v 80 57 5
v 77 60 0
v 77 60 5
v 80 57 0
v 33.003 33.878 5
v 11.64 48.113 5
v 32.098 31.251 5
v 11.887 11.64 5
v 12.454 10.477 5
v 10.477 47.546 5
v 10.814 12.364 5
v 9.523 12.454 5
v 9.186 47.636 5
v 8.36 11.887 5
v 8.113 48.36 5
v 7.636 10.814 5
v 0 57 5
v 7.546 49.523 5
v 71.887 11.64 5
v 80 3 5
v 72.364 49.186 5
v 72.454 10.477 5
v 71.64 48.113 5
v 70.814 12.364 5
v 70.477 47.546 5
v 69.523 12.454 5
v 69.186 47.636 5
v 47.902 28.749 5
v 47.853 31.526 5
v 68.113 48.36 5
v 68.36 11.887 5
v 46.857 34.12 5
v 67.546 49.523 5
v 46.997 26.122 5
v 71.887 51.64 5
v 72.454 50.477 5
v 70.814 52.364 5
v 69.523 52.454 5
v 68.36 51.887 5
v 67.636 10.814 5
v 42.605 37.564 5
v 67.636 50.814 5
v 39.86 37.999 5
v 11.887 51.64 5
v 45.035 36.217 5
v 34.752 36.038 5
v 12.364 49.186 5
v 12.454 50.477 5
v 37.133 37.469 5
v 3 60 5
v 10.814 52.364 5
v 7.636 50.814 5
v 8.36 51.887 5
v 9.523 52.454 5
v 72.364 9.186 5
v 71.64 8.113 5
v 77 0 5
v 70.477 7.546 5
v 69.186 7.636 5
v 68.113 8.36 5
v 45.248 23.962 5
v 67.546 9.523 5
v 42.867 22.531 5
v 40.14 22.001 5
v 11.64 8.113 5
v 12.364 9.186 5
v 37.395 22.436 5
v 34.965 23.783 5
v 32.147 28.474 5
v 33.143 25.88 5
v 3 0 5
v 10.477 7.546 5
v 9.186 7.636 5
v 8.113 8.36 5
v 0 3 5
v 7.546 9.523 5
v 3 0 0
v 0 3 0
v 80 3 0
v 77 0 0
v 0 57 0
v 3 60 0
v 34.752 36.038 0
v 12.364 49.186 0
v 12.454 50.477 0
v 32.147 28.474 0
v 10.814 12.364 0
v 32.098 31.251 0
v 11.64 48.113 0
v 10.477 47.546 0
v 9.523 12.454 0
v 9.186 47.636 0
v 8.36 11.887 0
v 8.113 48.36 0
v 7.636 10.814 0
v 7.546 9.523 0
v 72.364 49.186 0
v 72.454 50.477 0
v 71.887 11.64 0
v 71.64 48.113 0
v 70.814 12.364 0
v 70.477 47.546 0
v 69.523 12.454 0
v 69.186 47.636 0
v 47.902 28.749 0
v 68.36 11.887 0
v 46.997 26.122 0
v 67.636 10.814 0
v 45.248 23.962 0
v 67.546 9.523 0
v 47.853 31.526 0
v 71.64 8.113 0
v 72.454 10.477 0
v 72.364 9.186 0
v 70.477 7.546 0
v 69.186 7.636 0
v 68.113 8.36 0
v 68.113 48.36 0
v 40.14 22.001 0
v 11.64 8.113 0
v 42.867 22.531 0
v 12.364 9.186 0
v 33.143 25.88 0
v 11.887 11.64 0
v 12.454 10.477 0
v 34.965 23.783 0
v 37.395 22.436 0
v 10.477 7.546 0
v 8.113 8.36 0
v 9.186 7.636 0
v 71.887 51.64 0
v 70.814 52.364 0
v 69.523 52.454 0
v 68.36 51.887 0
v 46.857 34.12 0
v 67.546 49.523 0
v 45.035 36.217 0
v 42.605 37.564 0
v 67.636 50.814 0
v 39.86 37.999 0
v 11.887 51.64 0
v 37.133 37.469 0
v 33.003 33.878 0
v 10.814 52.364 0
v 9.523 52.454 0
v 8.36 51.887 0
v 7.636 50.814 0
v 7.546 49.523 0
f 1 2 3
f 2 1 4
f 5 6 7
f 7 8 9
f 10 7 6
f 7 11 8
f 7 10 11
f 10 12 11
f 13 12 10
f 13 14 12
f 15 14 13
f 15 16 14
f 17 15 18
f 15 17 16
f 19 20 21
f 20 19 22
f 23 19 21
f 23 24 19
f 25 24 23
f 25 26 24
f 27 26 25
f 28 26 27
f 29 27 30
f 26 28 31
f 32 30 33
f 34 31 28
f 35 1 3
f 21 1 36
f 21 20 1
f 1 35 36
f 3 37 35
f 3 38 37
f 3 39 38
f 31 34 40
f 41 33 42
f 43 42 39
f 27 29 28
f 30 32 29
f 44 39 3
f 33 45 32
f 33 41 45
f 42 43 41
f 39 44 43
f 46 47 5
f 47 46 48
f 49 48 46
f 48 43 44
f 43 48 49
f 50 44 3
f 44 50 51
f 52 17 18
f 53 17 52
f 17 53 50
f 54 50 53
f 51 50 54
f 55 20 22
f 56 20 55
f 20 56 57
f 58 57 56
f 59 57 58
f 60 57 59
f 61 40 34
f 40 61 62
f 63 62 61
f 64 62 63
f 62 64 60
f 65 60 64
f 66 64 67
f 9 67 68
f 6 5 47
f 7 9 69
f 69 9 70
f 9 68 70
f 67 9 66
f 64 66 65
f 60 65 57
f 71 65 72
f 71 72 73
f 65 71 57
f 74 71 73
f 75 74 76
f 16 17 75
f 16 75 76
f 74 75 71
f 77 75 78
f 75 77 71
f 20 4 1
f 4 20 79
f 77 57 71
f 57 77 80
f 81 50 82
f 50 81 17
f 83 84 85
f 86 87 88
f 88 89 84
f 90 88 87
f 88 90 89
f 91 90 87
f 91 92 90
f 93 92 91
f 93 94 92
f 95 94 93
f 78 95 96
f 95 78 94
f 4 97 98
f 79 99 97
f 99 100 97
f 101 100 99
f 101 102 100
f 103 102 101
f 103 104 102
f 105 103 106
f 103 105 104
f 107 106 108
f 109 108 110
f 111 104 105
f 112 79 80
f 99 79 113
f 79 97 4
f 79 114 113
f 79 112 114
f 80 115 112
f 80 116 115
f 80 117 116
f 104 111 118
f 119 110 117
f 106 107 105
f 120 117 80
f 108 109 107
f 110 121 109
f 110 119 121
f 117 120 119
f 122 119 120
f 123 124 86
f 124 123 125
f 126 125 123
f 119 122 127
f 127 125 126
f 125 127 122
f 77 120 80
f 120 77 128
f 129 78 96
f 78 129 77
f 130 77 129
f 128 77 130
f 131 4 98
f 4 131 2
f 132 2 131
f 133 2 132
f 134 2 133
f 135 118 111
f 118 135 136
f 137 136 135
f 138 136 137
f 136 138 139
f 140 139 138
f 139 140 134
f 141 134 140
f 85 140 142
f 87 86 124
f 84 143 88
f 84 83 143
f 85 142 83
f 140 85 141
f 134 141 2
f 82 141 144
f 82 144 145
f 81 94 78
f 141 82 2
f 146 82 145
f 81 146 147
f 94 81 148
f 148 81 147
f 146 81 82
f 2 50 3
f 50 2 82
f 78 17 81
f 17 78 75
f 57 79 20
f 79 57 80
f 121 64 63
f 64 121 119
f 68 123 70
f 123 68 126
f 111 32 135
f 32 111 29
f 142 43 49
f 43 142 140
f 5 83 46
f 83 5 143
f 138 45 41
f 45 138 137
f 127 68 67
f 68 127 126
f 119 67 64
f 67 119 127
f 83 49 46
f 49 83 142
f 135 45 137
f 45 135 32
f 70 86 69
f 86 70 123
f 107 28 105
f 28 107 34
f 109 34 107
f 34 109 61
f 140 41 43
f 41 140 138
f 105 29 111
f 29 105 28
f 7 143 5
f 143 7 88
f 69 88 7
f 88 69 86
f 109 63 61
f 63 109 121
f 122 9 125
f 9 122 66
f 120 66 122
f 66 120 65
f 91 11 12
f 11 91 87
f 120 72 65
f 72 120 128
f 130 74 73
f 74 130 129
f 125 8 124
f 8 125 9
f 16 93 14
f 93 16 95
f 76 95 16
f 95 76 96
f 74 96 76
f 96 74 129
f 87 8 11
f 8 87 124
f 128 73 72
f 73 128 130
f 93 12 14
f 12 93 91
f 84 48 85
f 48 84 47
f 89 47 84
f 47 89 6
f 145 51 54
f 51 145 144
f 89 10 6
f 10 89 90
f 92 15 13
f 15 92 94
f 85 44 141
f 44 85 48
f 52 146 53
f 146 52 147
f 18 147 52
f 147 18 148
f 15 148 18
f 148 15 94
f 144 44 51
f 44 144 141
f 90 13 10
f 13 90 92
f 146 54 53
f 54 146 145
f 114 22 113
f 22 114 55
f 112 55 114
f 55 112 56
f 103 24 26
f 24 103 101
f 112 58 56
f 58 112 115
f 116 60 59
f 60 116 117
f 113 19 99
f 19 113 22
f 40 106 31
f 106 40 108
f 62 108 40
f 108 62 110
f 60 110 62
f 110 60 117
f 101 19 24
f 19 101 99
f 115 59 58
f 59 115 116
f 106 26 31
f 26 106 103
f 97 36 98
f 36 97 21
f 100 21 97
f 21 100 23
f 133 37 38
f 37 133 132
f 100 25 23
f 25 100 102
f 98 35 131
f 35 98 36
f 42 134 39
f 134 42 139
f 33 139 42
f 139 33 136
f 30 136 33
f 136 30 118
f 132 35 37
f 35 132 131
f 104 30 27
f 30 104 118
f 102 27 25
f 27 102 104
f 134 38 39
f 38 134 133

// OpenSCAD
$fn = 32;

// ----------------------------------------------------------------------
// Spacer plate: rect 80 x 60
// ----------------------------------------------------------------------

// --- parameters (mm) ---
bore_r = 8;               // centre bore radius
bolt_r = 2.5;             // bolt hole radius
plate_t = 5;              // plate thickness, Z (extrusion height)
plate_l = 80;             // plate length, X
plate_w = 60;             // plate width, Y
inset = 10;               // corner hole inset

profile = [[3, 0], [77, 0], [80, 3], [80, 57], [77, 60], [3, 60], [0, 57], [0, 3]];  // primary outline, 8 points, counter clockwise
void_1 = [[47.853, 31.526], [46.857, 34.12], [45.035, 36.217], [42.605, 37.564], [39.86, 37.999], [37.133, 37.469], [34.752, 36.038], [33.003, 33.878], [32.098, 31.251], [32.147, 28.474], [33.143, 25.88], [34.965, 23.783], [37.395, 22.436], [40.14, 22.001], [42.867, 22.531], [45.248, 23.962], [46.997, 26.122], [47.902, 28.749]];  // centre bore, 18 points
void_2 = [[12.454, 10.477], [11.887, 11.64], [10.814, 12.364], [9.523, 12.454], [8.36, 11.887], [7.636, 10.814], [7.546, 9.523], [8.113, 8.36], [9.186, 7.636], [10.477, 7.546], [11.64, 8.113], [12.364, 9.186]];  // corner hole, 12 points
void_3 = [[12.454, 50.477], [11.887, 51.64], [10.814, 52.364], [9.523, 52.454], [8.36, 51.887], [7.636, 50.814], [7.546, 49.523], [8.113, 48.36], [9.186, 47.636], [10.477, 47.546], [11.64, 48.113], [12.364, 49.186]];  // corner hole, 12 points
void_4 = [[72.454, 10.477], [71.887, 11.64], [70.814, 12.364], [69.523, 12.454], [68.36, 11.887], [67.636, 10.814], [67.546, 9.523], [68.113, 8.36], [69.186, 7.636], [70.477, 7.546], [71.64, 8.113], [72.364, 9.186]];  // corner hole, 12 points
void_5 = [[72.454, 50.477], [71.887, 51.64], [70.814, 52.364], [69.523, 52.454], [68.36, 51.887], [67.636, 50.814], [67.546, 49.523], [68.113, 48.36], [69.186, 47.636], [70.477, 47.546], [71.64, 48.113], [72.364, 49.186]];  // corner hole, 12 points

// --- the one profile operation ---
difference() {
  linear_extrude(height = plate_t) polygon(points = profile);
  translate([0, 0, -1])
    linear_extrude(height = plate_t + 2) polygon(points = void_1);
  translate([0, 0, -1])
    linear_extrude(height = plate_t + 2) polygon(points = void_2);
  translate([0, 0, -1])
    linear_extrude(height = plate_t + 2) polygon(points = void_3);
  translate([0, 0, -1])
    linear_extrude(height = plate_t + 2) polygon(points = void_4);
  translate([0, 0, -1])
    linear_extrude(height = plate_t + 2) polygon(points = void_5);
}
